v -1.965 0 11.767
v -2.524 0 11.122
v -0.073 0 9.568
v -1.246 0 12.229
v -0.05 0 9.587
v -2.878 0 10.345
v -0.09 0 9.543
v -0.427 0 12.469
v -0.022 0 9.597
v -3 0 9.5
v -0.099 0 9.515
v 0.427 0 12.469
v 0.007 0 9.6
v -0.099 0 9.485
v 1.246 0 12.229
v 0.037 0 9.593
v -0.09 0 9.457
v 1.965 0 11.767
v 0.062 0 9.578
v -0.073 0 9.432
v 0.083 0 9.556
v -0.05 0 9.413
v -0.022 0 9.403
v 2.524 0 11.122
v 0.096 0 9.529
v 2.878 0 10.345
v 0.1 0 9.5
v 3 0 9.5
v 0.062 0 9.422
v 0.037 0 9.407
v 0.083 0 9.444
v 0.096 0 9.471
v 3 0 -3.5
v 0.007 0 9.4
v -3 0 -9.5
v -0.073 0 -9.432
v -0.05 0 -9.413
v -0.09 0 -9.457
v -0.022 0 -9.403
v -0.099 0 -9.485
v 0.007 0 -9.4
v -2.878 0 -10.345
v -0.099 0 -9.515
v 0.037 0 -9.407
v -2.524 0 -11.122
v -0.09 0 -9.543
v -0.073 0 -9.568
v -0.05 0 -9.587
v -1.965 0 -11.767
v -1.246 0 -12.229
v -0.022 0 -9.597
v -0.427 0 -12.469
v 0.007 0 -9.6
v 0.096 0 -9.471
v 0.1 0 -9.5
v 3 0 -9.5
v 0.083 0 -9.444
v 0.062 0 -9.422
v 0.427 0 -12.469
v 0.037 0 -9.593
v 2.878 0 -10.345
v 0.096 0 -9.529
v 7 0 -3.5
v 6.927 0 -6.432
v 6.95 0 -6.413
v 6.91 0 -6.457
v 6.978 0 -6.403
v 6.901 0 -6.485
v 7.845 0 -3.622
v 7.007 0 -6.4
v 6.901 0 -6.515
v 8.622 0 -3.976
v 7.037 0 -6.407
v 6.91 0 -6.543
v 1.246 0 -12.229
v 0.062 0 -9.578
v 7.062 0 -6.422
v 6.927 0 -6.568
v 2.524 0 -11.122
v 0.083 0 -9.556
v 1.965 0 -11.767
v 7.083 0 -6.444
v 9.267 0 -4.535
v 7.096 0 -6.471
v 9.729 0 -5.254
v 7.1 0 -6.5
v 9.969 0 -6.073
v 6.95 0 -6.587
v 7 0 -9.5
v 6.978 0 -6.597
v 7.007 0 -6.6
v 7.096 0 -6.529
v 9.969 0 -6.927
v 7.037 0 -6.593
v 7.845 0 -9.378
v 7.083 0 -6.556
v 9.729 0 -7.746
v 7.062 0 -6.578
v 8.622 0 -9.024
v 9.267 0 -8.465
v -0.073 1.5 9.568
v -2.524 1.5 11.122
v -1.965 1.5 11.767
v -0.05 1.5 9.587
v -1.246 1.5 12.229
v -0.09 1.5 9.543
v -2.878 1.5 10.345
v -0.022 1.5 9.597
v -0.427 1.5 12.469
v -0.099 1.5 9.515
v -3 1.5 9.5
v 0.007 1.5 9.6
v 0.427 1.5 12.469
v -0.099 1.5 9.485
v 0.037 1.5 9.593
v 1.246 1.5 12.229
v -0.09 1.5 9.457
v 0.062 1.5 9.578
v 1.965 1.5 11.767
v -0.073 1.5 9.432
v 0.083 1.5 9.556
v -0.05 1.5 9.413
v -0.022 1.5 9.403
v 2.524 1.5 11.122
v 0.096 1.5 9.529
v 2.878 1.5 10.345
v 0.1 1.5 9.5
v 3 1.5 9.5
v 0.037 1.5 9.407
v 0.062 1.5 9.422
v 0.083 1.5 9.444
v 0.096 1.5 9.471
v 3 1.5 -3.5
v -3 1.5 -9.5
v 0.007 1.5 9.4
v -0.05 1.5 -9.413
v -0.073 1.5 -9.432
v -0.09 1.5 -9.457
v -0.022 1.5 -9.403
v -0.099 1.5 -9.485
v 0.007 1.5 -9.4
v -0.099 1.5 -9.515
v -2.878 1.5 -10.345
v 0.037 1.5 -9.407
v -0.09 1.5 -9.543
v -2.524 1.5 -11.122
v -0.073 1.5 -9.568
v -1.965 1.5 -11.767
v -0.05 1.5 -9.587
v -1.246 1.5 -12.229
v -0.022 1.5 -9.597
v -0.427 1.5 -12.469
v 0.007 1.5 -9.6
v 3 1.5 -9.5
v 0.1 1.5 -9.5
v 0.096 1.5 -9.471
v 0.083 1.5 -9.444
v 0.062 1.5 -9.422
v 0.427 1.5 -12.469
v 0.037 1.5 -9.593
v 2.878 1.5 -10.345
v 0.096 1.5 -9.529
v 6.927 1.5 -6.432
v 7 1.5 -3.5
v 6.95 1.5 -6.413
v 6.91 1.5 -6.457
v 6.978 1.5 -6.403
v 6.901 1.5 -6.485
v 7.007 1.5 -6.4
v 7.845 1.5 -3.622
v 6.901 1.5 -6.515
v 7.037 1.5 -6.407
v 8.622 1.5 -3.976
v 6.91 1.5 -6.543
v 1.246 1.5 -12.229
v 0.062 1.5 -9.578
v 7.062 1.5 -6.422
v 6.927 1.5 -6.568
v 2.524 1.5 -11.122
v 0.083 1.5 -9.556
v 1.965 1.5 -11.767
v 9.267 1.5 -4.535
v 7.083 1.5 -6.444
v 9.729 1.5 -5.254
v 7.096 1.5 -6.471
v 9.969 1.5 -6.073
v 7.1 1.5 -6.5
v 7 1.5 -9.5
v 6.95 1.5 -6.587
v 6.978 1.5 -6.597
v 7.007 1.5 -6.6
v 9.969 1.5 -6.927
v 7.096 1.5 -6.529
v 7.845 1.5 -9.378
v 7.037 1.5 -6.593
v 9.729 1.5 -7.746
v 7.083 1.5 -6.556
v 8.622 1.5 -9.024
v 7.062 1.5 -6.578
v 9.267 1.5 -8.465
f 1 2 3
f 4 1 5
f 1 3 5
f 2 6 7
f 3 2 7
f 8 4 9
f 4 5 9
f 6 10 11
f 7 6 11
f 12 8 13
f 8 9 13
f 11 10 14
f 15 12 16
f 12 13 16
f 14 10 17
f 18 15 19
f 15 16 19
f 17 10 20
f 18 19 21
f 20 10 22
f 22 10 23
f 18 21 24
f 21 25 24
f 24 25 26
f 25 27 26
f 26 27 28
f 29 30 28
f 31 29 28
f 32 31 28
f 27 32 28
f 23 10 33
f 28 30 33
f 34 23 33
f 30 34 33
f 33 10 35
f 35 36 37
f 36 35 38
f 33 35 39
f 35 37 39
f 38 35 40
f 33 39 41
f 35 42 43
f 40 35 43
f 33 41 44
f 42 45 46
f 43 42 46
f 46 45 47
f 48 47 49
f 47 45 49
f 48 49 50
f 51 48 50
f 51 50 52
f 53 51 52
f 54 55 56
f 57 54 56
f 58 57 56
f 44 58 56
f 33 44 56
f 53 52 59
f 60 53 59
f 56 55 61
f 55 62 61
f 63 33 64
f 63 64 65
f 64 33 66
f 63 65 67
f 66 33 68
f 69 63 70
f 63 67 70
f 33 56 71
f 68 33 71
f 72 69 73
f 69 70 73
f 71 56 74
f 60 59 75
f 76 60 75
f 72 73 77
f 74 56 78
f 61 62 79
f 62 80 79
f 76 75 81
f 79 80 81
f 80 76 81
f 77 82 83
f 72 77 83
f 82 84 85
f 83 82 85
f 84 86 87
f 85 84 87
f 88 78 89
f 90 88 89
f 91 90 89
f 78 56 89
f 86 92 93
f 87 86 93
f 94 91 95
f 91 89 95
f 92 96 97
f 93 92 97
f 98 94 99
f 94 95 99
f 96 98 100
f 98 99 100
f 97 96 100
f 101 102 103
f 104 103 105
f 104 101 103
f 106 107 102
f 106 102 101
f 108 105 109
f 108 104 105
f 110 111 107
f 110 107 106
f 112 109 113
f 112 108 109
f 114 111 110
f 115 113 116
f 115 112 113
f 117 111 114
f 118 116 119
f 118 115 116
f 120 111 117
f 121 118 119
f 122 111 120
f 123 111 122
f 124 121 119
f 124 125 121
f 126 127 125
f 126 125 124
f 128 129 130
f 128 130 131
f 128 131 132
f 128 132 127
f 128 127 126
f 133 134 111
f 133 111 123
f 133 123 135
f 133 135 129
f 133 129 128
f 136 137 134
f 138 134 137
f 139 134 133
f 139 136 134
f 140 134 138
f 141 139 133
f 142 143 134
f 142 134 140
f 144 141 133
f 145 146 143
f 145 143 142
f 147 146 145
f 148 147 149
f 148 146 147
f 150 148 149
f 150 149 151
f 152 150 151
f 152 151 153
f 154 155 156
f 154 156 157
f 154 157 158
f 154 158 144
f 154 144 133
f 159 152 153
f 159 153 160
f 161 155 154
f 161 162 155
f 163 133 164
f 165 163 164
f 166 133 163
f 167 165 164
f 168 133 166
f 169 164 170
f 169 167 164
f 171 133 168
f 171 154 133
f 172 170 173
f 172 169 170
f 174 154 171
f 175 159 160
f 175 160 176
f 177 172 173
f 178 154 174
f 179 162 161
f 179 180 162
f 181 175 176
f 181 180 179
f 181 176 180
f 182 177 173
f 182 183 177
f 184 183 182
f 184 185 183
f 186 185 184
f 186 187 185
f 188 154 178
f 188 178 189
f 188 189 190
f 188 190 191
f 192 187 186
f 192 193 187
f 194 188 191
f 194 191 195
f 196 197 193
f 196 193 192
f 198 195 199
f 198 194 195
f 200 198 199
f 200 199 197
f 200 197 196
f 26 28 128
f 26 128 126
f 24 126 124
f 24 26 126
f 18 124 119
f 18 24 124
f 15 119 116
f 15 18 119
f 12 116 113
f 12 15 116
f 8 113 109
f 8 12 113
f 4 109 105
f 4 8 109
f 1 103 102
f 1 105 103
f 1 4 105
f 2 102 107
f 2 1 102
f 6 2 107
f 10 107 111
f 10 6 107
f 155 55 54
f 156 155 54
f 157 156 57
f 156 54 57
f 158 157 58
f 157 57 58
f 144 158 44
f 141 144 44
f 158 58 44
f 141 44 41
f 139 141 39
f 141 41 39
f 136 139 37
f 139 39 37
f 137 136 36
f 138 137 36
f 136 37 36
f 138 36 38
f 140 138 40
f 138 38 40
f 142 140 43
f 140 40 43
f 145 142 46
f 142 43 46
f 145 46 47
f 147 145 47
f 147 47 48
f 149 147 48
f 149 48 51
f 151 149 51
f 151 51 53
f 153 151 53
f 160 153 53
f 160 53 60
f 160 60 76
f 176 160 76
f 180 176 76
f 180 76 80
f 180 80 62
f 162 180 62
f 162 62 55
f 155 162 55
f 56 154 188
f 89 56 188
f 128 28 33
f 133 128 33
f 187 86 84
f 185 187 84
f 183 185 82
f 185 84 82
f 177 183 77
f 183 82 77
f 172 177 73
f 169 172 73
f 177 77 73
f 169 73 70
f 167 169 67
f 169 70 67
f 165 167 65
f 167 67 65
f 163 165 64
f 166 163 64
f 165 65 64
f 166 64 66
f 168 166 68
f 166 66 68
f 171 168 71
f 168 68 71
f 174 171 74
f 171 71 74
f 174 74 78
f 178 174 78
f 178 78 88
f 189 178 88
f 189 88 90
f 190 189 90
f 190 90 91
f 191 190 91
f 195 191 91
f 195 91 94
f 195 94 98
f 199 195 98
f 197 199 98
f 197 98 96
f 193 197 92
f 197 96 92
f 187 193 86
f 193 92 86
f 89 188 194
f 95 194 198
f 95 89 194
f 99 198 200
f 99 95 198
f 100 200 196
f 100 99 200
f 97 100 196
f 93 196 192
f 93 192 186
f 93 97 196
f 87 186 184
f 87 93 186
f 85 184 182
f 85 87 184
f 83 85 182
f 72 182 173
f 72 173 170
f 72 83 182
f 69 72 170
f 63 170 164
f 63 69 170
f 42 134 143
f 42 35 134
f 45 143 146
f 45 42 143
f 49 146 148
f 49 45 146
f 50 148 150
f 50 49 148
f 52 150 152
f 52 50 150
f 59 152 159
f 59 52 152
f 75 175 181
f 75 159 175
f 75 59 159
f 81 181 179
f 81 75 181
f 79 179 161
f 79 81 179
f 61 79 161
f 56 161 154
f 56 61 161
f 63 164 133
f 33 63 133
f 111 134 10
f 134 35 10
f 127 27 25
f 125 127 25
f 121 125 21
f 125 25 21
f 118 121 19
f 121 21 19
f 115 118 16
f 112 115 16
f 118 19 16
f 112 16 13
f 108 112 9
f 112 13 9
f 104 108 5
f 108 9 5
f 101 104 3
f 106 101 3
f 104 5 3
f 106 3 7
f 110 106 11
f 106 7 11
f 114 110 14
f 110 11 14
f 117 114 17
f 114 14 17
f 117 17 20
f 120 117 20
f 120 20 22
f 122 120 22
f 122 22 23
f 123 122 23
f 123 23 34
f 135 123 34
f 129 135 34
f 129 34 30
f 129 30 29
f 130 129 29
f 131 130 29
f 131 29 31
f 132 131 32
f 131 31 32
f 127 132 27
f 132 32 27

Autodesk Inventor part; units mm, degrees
ref_plane "YZ Plane" through (0, 0, 0) normal (1, 0, 0) x (0, 1, 0)
ref_plane "XZ Plane" through (0, 0, 0) normal (0, 1, 0) x (-1, 0, 0)
ref_plane "XY Plane" through (0, 0, 0) normal (0, 0, 1) x (1, 0, 0)
sketch "Sketch1" plane through (0, 0, 0) normal (0, 1, 0) x (-1, 0, 0)
  line L0 (3, 9.5) -> (-3, 9.5)
  line L1 (-3, 9.5) -> (-3, -9.5)
  line L2 (-3, -9.5) -> (3, -9.5)
  line L3 (3, -9.5) -> (3, 9.5)
  line L4 (3, 9.5) -> (-3, -9.5) construction
  line L5 (-3, 9.5) -> (3, -9.5) construction
  circle A0 centre (0, 9.5) radius 3
  circle A1 centre (0, -9.5) radius 3
  line L6 (-3, -9.5) -> (-7, -9.5)
  line L7 (-7, -9.5) -> (-7, -5.5)
  line L8 (-7, -5.5) -> (-7, -3.5)
  line L9 (-7, -3.5) -> (-3, -3.5)
  line L10 (-7, -3.5) -> (-7, -6.5)
  circle A2 centre (-7, -6.5) radius 3
  line L11 (-3, -3.5) -> (-3, -9.5)
  point P0 (0, 0)
  dimension "d0" = 6
  dimension "d1" = 19
  dimension "d2" = 6
  dimension "d4" = 6
  dimension "d5" = 4
  dimension "d6" = 4
  dimension "d7" = 2
  dimension "d10" = 3
  dimension "d11" = 6
extrude "Extrusion1" add sketch "Sketch1" along normal blind 1.5 contours A0 L0 | L0 A0 | L3 A1 L1 A0 | A1 L2 | L2 A1 | A2 L7 L8 | L8 L7 A2
sketch "Sketch2" plane through (0, 1.5, 0) normal (0, 1, 0) x (1, 0, 0)
  line L0 (3, -9.5) -> (3, 9.5) projected
  arc A0 (3, 9.5) -> (-3, 9.5) centre (0, 9.5) ccw projected
  line L1 (-3, 9.5) -> (-3, -9.5) projected
  arc A1 (-3, -9.5) -> (3, -9.5) centre (0, -9.5) ccw projected
  circle A2 centre (0, 9.5) radius 1.5
  circle A3 centre (0, -9.5) radius 1.5
  line L2 (3, 9.5) -> (7, 9.5)
  line L3 (7, 9.5) -> (7, 3.5)
  line L4 (7, 3.5) -> (3, 3.5)
  line L5 (3, 3.5) -> (3, 9.5)
  point P0 (0, 0)
  dimension "d14" = 3
  dimension "d15" = 3
  dimension "d16" = 4
  dimension "d17" = 6
extrude "Extrusion2" cut sketch "Sketch2" against normal blind 1.5 contours L0 L2 L3 L4 | A2 | A3
sketch "Sketch3" plane through (0, 1.5, 0) normal (0, 1, 0) x (1, 0, 0)
  line L0 (3, -9.5) -> (3, 9.5) projected
  arc A0 (3, 9.5) -> (-3, 9.5) centre (0, 9.5) ccw projected
  line L1 (-3, 9.5) -> (-3, -9.5) projected
  line L2 (3, 9.5) -> (7, 9.5)
  line L3 (7, 9.5) -> (7, 3.5)
  line L4 (7, 3.5) -> (3, 3.5)
  line L5 (3, 3.5) -> (3, 9.5)
  point P0 (0, 0)
  dimension "d20" = 4
  dimension "d21" = 6
  dimension "d22" = 4
extrude "Extrusion3" add sketch "Sketch3" against normal blind 1.5
sketch "Sketch4" plane through (0, 1.5, 0) normal (0, 1, 0) x (1, 0, 0)
  arc A0 (7, 3.5) -> (7, 9.5) centre (7, 6.5) ccw projected
  circle A1 centre (7, 6.5) radius 1.5
  point P0 (0, 0)
  dimension "d25" = 3
extrude "Extrusion4" cut sketch "Sketch4" against normal blind 1.5
sketch "Sketch5" plane through (0, 0, 0) normal (0, -1, 0) x (1, 0, 0)
  circle A0 centre (7, -6.5) radius 1.5 projected
  circle A1 centre (0, 9.5) radius 1.5 projected
  circle A2 centre (0, -9.5) radius 1.5 projected
  arc A3 (7, -9.5) -> (7, -3.5) centre (7, -6.5) ccw projected
  arc A4 (3, 9.5) -> (-3, 9.5) centre (0, 9.5) ccw projected
  arc A5 (-3, -9.5) -> (3, -9.5) centre (0, -9.5) ccw projected
  circle A6 centre (0, 9.5) radius 0.1
  circle A7 centre (0, -9.5) radius 0.1
  circle A8 centre (7, -6.5) radius 0.1
  point P0 (0, 0)
  dimension "d28" = 0.2
  dimension "d29" = 0.2
  dimension "d30" = 0.2
extrude "Extrusion5" add sketch "Sketch5" against normal blind 1.5
properties part number "tahlo3_sablona_19"
